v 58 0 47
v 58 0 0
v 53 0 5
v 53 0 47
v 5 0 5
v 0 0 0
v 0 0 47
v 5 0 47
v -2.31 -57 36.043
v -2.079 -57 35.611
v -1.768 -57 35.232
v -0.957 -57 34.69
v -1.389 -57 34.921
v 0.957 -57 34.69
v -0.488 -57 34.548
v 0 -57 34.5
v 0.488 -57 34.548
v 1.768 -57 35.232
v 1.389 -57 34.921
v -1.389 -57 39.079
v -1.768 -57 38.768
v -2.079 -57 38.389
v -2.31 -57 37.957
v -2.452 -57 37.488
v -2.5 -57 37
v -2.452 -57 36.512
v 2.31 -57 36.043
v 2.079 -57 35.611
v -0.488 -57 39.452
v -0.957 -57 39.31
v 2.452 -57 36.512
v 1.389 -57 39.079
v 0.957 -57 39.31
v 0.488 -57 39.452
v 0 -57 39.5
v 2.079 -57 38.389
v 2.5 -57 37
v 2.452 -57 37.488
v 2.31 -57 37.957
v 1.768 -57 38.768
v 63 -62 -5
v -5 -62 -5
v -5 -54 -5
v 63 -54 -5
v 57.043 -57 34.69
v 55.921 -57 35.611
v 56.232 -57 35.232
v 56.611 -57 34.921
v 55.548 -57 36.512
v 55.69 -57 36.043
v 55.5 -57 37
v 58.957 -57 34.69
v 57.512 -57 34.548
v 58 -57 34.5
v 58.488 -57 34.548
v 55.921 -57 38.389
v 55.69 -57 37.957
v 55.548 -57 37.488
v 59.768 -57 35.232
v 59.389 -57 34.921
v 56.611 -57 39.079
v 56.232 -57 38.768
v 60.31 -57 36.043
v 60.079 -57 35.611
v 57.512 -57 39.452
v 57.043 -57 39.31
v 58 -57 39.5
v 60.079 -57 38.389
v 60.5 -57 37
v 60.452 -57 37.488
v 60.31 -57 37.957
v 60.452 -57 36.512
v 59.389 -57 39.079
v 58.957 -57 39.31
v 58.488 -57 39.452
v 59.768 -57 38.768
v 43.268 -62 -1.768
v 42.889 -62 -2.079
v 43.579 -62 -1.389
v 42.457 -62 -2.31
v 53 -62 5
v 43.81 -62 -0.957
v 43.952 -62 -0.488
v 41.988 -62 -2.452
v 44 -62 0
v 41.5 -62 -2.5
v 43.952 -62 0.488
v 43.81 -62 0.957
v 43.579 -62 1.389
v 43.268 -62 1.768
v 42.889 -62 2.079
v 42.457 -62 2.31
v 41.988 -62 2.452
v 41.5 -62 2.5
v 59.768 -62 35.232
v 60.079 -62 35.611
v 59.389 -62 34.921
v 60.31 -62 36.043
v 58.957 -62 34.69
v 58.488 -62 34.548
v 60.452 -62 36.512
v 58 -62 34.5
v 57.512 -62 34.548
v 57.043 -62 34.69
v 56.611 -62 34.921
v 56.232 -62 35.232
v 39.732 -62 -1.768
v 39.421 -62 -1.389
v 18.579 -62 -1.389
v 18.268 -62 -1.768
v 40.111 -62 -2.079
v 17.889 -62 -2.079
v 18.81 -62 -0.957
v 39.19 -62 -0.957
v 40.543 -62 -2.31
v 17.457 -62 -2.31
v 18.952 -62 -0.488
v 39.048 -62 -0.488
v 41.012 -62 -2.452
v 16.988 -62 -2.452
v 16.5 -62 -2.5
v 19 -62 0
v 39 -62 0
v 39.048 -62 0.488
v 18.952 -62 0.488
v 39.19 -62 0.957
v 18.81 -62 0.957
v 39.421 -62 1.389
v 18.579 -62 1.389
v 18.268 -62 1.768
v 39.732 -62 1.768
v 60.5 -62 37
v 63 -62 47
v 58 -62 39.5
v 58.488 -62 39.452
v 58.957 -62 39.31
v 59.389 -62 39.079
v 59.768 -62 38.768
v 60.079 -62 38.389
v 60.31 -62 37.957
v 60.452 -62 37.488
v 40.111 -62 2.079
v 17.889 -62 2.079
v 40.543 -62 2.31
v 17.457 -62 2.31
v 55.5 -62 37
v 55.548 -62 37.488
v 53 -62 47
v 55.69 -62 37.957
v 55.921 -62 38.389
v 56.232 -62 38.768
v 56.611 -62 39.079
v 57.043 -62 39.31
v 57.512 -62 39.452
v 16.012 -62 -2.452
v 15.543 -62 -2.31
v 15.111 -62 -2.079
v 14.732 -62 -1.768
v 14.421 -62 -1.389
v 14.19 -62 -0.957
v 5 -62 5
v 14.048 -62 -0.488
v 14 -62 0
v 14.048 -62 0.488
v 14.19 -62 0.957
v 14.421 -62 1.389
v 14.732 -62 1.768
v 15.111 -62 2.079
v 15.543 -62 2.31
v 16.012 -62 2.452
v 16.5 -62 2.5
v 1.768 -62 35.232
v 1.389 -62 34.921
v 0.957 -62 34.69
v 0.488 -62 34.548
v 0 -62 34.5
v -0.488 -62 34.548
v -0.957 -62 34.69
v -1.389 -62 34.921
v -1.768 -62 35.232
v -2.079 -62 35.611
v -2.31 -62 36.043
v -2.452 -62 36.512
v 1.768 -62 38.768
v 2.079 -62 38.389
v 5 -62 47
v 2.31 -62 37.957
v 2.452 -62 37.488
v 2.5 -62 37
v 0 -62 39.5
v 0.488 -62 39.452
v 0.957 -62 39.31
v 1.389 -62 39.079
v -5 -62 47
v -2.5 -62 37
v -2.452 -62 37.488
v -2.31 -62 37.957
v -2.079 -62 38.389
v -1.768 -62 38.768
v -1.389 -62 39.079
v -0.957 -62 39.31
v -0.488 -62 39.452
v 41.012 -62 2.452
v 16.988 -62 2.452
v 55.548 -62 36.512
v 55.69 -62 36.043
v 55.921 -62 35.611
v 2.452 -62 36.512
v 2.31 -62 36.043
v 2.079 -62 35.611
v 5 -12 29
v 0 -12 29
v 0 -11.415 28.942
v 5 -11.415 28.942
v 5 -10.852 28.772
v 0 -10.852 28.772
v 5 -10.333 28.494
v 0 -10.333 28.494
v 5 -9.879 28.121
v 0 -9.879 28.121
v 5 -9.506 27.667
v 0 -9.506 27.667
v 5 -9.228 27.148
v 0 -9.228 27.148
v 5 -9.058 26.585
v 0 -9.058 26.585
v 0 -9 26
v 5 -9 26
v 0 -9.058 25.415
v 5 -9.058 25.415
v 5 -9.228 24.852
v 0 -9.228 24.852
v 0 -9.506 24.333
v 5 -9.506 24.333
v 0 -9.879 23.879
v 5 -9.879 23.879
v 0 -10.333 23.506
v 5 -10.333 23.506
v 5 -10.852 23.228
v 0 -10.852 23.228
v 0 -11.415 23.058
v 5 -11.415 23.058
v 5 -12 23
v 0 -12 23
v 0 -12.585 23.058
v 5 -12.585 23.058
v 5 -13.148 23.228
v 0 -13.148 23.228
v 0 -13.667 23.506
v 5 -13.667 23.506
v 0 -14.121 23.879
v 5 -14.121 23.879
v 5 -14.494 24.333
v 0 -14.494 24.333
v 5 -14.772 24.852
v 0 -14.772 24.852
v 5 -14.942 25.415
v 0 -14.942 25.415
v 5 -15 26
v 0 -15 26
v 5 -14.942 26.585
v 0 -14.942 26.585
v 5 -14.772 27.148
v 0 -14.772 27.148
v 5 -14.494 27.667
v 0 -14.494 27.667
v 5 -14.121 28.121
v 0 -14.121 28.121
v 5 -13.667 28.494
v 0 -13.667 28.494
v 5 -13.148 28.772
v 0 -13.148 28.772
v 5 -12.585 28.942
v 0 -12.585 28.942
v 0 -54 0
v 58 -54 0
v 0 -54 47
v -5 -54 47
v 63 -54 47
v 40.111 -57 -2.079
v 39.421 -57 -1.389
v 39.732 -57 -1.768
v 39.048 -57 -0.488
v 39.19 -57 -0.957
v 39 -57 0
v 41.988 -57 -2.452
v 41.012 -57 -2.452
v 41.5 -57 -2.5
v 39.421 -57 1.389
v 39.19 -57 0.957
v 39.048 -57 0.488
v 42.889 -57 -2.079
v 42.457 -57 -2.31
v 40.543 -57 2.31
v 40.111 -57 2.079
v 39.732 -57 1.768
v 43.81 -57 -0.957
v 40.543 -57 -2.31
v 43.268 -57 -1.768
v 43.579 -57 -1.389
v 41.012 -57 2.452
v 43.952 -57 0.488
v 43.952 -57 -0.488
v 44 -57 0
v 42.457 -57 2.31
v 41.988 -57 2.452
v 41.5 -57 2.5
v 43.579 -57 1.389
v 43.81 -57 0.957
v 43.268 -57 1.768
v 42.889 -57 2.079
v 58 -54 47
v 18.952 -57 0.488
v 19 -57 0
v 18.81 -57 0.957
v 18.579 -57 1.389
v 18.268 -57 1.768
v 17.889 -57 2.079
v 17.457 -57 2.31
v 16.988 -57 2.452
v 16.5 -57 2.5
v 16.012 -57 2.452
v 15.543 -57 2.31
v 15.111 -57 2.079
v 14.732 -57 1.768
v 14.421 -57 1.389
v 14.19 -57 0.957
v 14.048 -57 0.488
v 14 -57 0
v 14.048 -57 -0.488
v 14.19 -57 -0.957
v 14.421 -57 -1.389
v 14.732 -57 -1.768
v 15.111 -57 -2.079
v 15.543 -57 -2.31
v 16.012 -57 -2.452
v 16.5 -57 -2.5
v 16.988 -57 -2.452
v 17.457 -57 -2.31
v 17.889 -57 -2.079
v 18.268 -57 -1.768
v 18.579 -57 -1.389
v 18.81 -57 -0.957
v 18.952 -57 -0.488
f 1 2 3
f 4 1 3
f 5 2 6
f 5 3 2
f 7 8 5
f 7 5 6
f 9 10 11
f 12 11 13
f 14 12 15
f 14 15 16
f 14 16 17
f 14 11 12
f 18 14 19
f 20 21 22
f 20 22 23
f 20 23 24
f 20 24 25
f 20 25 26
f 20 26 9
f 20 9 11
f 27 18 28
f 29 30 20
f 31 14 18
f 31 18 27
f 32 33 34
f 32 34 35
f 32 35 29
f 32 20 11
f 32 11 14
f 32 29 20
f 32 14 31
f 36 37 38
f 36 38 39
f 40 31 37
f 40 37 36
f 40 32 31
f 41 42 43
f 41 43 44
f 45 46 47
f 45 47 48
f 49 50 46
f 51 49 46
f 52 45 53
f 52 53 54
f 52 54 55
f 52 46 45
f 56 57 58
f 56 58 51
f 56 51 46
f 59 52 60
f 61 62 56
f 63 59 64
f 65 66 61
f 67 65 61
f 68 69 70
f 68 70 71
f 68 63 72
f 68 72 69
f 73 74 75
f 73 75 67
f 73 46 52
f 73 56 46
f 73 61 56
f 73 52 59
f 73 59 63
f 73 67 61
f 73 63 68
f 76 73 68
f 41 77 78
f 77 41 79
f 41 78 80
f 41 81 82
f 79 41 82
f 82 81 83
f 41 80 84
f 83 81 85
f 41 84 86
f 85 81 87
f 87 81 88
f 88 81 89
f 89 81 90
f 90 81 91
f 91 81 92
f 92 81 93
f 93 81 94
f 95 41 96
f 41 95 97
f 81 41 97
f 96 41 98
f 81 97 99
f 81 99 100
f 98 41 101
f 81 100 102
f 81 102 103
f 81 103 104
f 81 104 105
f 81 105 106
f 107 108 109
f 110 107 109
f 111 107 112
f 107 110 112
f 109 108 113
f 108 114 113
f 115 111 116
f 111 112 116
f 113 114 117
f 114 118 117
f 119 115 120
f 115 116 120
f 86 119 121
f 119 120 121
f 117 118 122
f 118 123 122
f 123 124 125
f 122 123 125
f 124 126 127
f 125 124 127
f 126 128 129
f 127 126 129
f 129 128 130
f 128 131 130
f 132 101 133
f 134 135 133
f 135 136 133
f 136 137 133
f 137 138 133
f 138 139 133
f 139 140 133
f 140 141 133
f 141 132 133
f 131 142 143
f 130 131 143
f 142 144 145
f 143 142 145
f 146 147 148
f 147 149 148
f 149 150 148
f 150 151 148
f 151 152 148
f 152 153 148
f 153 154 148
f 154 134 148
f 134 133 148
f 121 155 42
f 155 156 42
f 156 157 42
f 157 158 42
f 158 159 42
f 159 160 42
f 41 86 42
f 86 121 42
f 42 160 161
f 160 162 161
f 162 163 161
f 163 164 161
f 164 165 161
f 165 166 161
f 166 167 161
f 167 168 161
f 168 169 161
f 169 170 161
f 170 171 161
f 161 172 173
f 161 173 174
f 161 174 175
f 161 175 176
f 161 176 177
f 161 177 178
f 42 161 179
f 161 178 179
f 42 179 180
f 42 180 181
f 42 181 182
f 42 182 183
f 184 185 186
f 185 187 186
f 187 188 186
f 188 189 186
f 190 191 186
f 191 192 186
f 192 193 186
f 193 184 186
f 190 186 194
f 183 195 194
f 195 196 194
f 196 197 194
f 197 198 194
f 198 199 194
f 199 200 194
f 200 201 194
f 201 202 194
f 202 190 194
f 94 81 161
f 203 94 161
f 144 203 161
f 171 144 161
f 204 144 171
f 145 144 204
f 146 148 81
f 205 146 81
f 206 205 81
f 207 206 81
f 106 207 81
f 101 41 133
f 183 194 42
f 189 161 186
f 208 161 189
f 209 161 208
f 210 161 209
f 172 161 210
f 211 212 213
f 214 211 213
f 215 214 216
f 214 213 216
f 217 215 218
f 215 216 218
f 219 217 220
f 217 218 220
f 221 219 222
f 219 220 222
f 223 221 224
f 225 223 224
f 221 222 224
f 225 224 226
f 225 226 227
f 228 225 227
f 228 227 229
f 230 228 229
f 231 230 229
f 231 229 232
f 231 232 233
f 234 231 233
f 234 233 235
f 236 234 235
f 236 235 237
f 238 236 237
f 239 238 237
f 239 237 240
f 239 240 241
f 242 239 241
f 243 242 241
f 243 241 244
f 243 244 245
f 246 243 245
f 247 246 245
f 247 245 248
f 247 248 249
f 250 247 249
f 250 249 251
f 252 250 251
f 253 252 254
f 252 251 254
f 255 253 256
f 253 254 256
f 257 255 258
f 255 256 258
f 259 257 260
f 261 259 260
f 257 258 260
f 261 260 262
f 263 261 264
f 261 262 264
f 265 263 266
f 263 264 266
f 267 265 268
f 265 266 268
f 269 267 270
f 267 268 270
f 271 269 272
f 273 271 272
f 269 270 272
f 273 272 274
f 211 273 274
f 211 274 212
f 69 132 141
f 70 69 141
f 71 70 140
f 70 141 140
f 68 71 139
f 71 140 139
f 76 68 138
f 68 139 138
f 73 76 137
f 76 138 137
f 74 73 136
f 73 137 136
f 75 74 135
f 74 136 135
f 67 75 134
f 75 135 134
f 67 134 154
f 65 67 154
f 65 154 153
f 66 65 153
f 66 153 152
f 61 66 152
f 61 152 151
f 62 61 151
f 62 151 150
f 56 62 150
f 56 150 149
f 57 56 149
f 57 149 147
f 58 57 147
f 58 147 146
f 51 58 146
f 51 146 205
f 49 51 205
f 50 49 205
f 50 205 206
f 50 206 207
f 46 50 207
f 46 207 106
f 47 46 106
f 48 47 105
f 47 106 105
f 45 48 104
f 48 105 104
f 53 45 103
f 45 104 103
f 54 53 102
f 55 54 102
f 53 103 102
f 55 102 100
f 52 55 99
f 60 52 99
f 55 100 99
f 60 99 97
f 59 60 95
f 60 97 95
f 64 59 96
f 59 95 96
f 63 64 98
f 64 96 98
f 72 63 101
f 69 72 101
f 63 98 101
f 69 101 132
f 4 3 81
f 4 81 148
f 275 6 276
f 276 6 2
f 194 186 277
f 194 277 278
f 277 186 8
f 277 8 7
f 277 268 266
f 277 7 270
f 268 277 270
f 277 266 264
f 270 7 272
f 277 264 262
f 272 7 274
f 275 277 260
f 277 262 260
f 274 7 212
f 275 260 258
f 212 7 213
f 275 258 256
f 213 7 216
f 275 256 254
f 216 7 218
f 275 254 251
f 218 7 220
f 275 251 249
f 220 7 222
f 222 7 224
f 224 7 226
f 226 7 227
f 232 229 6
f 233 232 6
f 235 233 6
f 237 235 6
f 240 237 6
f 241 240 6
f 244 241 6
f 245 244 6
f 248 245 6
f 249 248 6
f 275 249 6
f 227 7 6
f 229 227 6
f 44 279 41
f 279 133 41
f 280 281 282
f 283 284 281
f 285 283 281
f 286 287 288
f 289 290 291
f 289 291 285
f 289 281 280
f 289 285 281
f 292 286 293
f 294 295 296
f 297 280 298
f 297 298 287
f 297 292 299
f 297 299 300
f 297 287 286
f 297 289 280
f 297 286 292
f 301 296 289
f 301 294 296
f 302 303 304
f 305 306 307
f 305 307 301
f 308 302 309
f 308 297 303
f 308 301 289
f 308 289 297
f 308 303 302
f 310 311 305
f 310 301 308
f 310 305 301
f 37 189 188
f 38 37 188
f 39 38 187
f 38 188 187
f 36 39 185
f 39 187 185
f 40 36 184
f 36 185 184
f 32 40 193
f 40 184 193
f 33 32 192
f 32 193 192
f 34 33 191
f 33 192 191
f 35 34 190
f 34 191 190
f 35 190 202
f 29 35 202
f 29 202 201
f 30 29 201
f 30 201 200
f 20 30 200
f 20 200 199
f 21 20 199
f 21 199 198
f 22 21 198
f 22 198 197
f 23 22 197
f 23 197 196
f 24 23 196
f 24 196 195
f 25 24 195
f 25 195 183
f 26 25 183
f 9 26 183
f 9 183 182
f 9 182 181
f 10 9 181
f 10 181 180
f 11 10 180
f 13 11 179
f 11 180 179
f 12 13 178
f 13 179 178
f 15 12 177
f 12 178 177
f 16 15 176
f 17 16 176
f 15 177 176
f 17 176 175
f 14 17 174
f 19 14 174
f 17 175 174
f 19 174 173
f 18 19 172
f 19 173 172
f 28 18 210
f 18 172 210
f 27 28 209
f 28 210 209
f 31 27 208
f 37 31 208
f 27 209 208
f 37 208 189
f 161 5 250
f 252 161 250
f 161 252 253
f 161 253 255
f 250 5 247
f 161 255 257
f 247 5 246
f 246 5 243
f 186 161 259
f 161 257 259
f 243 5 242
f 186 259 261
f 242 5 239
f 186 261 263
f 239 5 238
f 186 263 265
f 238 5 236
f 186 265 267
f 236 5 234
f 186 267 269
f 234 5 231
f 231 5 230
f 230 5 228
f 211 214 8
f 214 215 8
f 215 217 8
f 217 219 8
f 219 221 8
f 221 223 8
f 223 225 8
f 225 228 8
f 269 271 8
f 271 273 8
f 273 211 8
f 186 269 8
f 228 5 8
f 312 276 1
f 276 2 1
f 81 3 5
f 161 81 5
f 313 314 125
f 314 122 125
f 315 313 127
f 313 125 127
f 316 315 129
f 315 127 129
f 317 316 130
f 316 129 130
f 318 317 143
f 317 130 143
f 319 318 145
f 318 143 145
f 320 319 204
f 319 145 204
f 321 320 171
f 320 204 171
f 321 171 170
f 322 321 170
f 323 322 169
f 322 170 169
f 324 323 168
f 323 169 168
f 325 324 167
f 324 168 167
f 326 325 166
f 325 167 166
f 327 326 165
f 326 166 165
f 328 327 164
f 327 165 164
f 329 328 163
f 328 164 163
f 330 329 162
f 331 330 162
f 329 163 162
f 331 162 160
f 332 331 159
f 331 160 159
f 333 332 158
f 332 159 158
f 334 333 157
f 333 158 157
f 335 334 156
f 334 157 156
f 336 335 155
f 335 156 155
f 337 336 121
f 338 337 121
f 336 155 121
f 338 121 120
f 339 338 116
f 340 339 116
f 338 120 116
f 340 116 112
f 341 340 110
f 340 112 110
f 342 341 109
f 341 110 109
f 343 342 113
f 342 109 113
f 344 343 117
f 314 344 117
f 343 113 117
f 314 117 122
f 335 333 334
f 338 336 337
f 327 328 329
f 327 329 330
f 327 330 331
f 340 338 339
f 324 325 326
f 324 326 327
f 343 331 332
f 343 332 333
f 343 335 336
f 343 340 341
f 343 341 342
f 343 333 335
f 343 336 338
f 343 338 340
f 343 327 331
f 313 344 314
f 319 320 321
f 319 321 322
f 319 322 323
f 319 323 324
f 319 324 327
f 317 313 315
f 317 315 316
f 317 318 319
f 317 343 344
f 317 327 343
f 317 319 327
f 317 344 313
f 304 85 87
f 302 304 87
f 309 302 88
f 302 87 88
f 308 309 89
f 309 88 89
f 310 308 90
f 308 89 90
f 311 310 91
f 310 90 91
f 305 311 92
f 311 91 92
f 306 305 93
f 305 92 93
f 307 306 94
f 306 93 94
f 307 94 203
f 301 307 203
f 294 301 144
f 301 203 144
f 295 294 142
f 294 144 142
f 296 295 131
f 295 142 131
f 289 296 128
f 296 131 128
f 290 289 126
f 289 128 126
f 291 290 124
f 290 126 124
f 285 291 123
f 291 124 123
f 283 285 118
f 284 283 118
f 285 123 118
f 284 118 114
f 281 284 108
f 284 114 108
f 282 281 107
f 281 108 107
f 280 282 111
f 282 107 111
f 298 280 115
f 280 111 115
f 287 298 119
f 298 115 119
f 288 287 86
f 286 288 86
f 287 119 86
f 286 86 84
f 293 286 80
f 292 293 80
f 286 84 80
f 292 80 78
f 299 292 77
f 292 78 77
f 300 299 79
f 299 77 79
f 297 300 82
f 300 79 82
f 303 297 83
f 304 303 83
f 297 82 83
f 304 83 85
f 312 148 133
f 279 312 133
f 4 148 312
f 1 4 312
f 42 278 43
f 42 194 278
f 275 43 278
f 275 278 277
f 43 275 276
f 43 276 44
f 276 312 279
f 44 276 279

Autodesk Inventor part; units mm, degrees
ref_plane "YZ Plane" through (0, 0, 0) normal (1, 0, 0) x (0, 1, 0)
ref_plane "XZ Plane" through (0, 0, 0) normal (0, 1, 0) x (-1, 0, 0)
ref_plane "XY Plane" through (0, 0, 0) normal (0, 0, 1) x (1, 0, 0)
sketch "Sketch1" plane through (0, 0, 0) normal (0, 1, 0) x (-1, 0, 0)
  line L0 (0, 0) -> (-58, 0)
  line L1 (-58, 0) -> (-58, 5)
  line L2 (-58, 5) -> (0, 5)
  line L3 (0, 5) -> (0, 0)
  line L4 (0, 5) -> (-5, 5)
  line L5 (-5, 5) -> (-5, 47)
  line L6 (-5, 47) -> (0, 47)
  line L7 (0, 47) -> (0, 5)
  line L8 (-58, 5) -> (-53, 5)
  line L9 (-53, 5) -> (-53, 47)
  line L10 (-53, 47) -> (-58, 47)
  line L11 (-58, 47) -> (-58, 5)
  dimension "d0" = 58
  dimension "d1" = 5
  dimension "d2" = 5
  dimension "d3" = 42
  dimension "d4" = 5
  dimension "d5" = 42
extrude "Extrusion1" add sketch "Sketch1" against normal blind 62
sketch "Sketch2" plane through (58, 0, 47) normal (1, 0, 0) x (0, 0, -1)
  line L0 (0, 0) -> (0, -62) projected
  line L1 (47, -62) -> (0, -62) projected
  circle A0 centre (21, -12) radius 3
  point P0 (47, 0)
  point P1 (23.5, -62)
  dimension "d8" = 21
  dimension "d9" = 50
  dimension "d10" = 6
sketch "Sketch3" plane through (0, -62, 0) normal (0, -1, 0) x (1, 0, 0)
  line L0 (53, 47) -> (58, 47) projected
  line L1 (58, 47) -> (63, 47)
  line L2 (63, 47) -> (63, 0)
  line L3 (63, 0) -> (58, 0)
  line L4 (58, 0) -> (58, 47)
  line L5 (0, 0) -> (0, 47) projected
  line L6 (0, 47) -> (-5, 47)
  line L7 (-5, 47) -> (-5, 0)
  line L8 (-5, 0) -> (0, 0)
  line L9 (0, 0) -> (0, 47)
  line L10 (63, 0) -> (-5, 0)
  line L11 (-5, 0) -> (-5, -5)
  line L12 (-5, -5) -> (63, -5)
  line L13 (63, -5) -> (63, 0)
  dimension "d13" = 5
  dimension "d14" = 5
  dimension "d15" = 5
extrude "Extrusion3" add sketch "Sketch3" against normal blind 8
sketch "Sketch4" plane through (0, -62, 0) normal (0, -1, 0) x (1, 0, 0)
  line L0 (58, 47) -> (58, 0) projected
  line L1 (63, 47) -> (53, 47) projected
  line L2 (0, 0) -> (0, 47) projected
  line L3 (5, 47) -> (-5, 47) projected
  circle A0 centre (58, 37) radius 2.5
  circle A1 centre (0, 37) radius 2.5
  line L4 (58, 0) -> (0, 0) projected
  circle A2 centre (16.5, 0) radius 2.5
  circle A3 centre (41.5, 0) radius 2.5
  point P0 (29, 0)
  dimension "d18" = 10
  dimension "d19" = 10
  dimension "d20" = 5
  dimension "d21" = 5
  dimension "d29" = 5
  dimension "d30" = 5
sketch "Sketch5" plane through (0, 0, 0) normal (-1, 0, 0) x (0, 0, 1)
  circle A0 centre (26, -12) radius 3 projected
  circle A1 centre (26, -12) radius 3
  point P0 (0, 0)
extrude "Extrusion5" cut sketch "Sketch5" against normal blind 5
extrude "Extrusion6" cut sketch "Sketch4" against normal blind 5
equation "\"d4\" = d2"
equation "\"d5\" = d3"
equation "\"d14\" = d13"
equation "\"d15\" = d13"
equation "\"d19\" = d18"
equation "\"d21\" = d20"
equation "\"d29\" = d20"
equation "\"d30\" = d20"
properties part number "top cam mount v02"
